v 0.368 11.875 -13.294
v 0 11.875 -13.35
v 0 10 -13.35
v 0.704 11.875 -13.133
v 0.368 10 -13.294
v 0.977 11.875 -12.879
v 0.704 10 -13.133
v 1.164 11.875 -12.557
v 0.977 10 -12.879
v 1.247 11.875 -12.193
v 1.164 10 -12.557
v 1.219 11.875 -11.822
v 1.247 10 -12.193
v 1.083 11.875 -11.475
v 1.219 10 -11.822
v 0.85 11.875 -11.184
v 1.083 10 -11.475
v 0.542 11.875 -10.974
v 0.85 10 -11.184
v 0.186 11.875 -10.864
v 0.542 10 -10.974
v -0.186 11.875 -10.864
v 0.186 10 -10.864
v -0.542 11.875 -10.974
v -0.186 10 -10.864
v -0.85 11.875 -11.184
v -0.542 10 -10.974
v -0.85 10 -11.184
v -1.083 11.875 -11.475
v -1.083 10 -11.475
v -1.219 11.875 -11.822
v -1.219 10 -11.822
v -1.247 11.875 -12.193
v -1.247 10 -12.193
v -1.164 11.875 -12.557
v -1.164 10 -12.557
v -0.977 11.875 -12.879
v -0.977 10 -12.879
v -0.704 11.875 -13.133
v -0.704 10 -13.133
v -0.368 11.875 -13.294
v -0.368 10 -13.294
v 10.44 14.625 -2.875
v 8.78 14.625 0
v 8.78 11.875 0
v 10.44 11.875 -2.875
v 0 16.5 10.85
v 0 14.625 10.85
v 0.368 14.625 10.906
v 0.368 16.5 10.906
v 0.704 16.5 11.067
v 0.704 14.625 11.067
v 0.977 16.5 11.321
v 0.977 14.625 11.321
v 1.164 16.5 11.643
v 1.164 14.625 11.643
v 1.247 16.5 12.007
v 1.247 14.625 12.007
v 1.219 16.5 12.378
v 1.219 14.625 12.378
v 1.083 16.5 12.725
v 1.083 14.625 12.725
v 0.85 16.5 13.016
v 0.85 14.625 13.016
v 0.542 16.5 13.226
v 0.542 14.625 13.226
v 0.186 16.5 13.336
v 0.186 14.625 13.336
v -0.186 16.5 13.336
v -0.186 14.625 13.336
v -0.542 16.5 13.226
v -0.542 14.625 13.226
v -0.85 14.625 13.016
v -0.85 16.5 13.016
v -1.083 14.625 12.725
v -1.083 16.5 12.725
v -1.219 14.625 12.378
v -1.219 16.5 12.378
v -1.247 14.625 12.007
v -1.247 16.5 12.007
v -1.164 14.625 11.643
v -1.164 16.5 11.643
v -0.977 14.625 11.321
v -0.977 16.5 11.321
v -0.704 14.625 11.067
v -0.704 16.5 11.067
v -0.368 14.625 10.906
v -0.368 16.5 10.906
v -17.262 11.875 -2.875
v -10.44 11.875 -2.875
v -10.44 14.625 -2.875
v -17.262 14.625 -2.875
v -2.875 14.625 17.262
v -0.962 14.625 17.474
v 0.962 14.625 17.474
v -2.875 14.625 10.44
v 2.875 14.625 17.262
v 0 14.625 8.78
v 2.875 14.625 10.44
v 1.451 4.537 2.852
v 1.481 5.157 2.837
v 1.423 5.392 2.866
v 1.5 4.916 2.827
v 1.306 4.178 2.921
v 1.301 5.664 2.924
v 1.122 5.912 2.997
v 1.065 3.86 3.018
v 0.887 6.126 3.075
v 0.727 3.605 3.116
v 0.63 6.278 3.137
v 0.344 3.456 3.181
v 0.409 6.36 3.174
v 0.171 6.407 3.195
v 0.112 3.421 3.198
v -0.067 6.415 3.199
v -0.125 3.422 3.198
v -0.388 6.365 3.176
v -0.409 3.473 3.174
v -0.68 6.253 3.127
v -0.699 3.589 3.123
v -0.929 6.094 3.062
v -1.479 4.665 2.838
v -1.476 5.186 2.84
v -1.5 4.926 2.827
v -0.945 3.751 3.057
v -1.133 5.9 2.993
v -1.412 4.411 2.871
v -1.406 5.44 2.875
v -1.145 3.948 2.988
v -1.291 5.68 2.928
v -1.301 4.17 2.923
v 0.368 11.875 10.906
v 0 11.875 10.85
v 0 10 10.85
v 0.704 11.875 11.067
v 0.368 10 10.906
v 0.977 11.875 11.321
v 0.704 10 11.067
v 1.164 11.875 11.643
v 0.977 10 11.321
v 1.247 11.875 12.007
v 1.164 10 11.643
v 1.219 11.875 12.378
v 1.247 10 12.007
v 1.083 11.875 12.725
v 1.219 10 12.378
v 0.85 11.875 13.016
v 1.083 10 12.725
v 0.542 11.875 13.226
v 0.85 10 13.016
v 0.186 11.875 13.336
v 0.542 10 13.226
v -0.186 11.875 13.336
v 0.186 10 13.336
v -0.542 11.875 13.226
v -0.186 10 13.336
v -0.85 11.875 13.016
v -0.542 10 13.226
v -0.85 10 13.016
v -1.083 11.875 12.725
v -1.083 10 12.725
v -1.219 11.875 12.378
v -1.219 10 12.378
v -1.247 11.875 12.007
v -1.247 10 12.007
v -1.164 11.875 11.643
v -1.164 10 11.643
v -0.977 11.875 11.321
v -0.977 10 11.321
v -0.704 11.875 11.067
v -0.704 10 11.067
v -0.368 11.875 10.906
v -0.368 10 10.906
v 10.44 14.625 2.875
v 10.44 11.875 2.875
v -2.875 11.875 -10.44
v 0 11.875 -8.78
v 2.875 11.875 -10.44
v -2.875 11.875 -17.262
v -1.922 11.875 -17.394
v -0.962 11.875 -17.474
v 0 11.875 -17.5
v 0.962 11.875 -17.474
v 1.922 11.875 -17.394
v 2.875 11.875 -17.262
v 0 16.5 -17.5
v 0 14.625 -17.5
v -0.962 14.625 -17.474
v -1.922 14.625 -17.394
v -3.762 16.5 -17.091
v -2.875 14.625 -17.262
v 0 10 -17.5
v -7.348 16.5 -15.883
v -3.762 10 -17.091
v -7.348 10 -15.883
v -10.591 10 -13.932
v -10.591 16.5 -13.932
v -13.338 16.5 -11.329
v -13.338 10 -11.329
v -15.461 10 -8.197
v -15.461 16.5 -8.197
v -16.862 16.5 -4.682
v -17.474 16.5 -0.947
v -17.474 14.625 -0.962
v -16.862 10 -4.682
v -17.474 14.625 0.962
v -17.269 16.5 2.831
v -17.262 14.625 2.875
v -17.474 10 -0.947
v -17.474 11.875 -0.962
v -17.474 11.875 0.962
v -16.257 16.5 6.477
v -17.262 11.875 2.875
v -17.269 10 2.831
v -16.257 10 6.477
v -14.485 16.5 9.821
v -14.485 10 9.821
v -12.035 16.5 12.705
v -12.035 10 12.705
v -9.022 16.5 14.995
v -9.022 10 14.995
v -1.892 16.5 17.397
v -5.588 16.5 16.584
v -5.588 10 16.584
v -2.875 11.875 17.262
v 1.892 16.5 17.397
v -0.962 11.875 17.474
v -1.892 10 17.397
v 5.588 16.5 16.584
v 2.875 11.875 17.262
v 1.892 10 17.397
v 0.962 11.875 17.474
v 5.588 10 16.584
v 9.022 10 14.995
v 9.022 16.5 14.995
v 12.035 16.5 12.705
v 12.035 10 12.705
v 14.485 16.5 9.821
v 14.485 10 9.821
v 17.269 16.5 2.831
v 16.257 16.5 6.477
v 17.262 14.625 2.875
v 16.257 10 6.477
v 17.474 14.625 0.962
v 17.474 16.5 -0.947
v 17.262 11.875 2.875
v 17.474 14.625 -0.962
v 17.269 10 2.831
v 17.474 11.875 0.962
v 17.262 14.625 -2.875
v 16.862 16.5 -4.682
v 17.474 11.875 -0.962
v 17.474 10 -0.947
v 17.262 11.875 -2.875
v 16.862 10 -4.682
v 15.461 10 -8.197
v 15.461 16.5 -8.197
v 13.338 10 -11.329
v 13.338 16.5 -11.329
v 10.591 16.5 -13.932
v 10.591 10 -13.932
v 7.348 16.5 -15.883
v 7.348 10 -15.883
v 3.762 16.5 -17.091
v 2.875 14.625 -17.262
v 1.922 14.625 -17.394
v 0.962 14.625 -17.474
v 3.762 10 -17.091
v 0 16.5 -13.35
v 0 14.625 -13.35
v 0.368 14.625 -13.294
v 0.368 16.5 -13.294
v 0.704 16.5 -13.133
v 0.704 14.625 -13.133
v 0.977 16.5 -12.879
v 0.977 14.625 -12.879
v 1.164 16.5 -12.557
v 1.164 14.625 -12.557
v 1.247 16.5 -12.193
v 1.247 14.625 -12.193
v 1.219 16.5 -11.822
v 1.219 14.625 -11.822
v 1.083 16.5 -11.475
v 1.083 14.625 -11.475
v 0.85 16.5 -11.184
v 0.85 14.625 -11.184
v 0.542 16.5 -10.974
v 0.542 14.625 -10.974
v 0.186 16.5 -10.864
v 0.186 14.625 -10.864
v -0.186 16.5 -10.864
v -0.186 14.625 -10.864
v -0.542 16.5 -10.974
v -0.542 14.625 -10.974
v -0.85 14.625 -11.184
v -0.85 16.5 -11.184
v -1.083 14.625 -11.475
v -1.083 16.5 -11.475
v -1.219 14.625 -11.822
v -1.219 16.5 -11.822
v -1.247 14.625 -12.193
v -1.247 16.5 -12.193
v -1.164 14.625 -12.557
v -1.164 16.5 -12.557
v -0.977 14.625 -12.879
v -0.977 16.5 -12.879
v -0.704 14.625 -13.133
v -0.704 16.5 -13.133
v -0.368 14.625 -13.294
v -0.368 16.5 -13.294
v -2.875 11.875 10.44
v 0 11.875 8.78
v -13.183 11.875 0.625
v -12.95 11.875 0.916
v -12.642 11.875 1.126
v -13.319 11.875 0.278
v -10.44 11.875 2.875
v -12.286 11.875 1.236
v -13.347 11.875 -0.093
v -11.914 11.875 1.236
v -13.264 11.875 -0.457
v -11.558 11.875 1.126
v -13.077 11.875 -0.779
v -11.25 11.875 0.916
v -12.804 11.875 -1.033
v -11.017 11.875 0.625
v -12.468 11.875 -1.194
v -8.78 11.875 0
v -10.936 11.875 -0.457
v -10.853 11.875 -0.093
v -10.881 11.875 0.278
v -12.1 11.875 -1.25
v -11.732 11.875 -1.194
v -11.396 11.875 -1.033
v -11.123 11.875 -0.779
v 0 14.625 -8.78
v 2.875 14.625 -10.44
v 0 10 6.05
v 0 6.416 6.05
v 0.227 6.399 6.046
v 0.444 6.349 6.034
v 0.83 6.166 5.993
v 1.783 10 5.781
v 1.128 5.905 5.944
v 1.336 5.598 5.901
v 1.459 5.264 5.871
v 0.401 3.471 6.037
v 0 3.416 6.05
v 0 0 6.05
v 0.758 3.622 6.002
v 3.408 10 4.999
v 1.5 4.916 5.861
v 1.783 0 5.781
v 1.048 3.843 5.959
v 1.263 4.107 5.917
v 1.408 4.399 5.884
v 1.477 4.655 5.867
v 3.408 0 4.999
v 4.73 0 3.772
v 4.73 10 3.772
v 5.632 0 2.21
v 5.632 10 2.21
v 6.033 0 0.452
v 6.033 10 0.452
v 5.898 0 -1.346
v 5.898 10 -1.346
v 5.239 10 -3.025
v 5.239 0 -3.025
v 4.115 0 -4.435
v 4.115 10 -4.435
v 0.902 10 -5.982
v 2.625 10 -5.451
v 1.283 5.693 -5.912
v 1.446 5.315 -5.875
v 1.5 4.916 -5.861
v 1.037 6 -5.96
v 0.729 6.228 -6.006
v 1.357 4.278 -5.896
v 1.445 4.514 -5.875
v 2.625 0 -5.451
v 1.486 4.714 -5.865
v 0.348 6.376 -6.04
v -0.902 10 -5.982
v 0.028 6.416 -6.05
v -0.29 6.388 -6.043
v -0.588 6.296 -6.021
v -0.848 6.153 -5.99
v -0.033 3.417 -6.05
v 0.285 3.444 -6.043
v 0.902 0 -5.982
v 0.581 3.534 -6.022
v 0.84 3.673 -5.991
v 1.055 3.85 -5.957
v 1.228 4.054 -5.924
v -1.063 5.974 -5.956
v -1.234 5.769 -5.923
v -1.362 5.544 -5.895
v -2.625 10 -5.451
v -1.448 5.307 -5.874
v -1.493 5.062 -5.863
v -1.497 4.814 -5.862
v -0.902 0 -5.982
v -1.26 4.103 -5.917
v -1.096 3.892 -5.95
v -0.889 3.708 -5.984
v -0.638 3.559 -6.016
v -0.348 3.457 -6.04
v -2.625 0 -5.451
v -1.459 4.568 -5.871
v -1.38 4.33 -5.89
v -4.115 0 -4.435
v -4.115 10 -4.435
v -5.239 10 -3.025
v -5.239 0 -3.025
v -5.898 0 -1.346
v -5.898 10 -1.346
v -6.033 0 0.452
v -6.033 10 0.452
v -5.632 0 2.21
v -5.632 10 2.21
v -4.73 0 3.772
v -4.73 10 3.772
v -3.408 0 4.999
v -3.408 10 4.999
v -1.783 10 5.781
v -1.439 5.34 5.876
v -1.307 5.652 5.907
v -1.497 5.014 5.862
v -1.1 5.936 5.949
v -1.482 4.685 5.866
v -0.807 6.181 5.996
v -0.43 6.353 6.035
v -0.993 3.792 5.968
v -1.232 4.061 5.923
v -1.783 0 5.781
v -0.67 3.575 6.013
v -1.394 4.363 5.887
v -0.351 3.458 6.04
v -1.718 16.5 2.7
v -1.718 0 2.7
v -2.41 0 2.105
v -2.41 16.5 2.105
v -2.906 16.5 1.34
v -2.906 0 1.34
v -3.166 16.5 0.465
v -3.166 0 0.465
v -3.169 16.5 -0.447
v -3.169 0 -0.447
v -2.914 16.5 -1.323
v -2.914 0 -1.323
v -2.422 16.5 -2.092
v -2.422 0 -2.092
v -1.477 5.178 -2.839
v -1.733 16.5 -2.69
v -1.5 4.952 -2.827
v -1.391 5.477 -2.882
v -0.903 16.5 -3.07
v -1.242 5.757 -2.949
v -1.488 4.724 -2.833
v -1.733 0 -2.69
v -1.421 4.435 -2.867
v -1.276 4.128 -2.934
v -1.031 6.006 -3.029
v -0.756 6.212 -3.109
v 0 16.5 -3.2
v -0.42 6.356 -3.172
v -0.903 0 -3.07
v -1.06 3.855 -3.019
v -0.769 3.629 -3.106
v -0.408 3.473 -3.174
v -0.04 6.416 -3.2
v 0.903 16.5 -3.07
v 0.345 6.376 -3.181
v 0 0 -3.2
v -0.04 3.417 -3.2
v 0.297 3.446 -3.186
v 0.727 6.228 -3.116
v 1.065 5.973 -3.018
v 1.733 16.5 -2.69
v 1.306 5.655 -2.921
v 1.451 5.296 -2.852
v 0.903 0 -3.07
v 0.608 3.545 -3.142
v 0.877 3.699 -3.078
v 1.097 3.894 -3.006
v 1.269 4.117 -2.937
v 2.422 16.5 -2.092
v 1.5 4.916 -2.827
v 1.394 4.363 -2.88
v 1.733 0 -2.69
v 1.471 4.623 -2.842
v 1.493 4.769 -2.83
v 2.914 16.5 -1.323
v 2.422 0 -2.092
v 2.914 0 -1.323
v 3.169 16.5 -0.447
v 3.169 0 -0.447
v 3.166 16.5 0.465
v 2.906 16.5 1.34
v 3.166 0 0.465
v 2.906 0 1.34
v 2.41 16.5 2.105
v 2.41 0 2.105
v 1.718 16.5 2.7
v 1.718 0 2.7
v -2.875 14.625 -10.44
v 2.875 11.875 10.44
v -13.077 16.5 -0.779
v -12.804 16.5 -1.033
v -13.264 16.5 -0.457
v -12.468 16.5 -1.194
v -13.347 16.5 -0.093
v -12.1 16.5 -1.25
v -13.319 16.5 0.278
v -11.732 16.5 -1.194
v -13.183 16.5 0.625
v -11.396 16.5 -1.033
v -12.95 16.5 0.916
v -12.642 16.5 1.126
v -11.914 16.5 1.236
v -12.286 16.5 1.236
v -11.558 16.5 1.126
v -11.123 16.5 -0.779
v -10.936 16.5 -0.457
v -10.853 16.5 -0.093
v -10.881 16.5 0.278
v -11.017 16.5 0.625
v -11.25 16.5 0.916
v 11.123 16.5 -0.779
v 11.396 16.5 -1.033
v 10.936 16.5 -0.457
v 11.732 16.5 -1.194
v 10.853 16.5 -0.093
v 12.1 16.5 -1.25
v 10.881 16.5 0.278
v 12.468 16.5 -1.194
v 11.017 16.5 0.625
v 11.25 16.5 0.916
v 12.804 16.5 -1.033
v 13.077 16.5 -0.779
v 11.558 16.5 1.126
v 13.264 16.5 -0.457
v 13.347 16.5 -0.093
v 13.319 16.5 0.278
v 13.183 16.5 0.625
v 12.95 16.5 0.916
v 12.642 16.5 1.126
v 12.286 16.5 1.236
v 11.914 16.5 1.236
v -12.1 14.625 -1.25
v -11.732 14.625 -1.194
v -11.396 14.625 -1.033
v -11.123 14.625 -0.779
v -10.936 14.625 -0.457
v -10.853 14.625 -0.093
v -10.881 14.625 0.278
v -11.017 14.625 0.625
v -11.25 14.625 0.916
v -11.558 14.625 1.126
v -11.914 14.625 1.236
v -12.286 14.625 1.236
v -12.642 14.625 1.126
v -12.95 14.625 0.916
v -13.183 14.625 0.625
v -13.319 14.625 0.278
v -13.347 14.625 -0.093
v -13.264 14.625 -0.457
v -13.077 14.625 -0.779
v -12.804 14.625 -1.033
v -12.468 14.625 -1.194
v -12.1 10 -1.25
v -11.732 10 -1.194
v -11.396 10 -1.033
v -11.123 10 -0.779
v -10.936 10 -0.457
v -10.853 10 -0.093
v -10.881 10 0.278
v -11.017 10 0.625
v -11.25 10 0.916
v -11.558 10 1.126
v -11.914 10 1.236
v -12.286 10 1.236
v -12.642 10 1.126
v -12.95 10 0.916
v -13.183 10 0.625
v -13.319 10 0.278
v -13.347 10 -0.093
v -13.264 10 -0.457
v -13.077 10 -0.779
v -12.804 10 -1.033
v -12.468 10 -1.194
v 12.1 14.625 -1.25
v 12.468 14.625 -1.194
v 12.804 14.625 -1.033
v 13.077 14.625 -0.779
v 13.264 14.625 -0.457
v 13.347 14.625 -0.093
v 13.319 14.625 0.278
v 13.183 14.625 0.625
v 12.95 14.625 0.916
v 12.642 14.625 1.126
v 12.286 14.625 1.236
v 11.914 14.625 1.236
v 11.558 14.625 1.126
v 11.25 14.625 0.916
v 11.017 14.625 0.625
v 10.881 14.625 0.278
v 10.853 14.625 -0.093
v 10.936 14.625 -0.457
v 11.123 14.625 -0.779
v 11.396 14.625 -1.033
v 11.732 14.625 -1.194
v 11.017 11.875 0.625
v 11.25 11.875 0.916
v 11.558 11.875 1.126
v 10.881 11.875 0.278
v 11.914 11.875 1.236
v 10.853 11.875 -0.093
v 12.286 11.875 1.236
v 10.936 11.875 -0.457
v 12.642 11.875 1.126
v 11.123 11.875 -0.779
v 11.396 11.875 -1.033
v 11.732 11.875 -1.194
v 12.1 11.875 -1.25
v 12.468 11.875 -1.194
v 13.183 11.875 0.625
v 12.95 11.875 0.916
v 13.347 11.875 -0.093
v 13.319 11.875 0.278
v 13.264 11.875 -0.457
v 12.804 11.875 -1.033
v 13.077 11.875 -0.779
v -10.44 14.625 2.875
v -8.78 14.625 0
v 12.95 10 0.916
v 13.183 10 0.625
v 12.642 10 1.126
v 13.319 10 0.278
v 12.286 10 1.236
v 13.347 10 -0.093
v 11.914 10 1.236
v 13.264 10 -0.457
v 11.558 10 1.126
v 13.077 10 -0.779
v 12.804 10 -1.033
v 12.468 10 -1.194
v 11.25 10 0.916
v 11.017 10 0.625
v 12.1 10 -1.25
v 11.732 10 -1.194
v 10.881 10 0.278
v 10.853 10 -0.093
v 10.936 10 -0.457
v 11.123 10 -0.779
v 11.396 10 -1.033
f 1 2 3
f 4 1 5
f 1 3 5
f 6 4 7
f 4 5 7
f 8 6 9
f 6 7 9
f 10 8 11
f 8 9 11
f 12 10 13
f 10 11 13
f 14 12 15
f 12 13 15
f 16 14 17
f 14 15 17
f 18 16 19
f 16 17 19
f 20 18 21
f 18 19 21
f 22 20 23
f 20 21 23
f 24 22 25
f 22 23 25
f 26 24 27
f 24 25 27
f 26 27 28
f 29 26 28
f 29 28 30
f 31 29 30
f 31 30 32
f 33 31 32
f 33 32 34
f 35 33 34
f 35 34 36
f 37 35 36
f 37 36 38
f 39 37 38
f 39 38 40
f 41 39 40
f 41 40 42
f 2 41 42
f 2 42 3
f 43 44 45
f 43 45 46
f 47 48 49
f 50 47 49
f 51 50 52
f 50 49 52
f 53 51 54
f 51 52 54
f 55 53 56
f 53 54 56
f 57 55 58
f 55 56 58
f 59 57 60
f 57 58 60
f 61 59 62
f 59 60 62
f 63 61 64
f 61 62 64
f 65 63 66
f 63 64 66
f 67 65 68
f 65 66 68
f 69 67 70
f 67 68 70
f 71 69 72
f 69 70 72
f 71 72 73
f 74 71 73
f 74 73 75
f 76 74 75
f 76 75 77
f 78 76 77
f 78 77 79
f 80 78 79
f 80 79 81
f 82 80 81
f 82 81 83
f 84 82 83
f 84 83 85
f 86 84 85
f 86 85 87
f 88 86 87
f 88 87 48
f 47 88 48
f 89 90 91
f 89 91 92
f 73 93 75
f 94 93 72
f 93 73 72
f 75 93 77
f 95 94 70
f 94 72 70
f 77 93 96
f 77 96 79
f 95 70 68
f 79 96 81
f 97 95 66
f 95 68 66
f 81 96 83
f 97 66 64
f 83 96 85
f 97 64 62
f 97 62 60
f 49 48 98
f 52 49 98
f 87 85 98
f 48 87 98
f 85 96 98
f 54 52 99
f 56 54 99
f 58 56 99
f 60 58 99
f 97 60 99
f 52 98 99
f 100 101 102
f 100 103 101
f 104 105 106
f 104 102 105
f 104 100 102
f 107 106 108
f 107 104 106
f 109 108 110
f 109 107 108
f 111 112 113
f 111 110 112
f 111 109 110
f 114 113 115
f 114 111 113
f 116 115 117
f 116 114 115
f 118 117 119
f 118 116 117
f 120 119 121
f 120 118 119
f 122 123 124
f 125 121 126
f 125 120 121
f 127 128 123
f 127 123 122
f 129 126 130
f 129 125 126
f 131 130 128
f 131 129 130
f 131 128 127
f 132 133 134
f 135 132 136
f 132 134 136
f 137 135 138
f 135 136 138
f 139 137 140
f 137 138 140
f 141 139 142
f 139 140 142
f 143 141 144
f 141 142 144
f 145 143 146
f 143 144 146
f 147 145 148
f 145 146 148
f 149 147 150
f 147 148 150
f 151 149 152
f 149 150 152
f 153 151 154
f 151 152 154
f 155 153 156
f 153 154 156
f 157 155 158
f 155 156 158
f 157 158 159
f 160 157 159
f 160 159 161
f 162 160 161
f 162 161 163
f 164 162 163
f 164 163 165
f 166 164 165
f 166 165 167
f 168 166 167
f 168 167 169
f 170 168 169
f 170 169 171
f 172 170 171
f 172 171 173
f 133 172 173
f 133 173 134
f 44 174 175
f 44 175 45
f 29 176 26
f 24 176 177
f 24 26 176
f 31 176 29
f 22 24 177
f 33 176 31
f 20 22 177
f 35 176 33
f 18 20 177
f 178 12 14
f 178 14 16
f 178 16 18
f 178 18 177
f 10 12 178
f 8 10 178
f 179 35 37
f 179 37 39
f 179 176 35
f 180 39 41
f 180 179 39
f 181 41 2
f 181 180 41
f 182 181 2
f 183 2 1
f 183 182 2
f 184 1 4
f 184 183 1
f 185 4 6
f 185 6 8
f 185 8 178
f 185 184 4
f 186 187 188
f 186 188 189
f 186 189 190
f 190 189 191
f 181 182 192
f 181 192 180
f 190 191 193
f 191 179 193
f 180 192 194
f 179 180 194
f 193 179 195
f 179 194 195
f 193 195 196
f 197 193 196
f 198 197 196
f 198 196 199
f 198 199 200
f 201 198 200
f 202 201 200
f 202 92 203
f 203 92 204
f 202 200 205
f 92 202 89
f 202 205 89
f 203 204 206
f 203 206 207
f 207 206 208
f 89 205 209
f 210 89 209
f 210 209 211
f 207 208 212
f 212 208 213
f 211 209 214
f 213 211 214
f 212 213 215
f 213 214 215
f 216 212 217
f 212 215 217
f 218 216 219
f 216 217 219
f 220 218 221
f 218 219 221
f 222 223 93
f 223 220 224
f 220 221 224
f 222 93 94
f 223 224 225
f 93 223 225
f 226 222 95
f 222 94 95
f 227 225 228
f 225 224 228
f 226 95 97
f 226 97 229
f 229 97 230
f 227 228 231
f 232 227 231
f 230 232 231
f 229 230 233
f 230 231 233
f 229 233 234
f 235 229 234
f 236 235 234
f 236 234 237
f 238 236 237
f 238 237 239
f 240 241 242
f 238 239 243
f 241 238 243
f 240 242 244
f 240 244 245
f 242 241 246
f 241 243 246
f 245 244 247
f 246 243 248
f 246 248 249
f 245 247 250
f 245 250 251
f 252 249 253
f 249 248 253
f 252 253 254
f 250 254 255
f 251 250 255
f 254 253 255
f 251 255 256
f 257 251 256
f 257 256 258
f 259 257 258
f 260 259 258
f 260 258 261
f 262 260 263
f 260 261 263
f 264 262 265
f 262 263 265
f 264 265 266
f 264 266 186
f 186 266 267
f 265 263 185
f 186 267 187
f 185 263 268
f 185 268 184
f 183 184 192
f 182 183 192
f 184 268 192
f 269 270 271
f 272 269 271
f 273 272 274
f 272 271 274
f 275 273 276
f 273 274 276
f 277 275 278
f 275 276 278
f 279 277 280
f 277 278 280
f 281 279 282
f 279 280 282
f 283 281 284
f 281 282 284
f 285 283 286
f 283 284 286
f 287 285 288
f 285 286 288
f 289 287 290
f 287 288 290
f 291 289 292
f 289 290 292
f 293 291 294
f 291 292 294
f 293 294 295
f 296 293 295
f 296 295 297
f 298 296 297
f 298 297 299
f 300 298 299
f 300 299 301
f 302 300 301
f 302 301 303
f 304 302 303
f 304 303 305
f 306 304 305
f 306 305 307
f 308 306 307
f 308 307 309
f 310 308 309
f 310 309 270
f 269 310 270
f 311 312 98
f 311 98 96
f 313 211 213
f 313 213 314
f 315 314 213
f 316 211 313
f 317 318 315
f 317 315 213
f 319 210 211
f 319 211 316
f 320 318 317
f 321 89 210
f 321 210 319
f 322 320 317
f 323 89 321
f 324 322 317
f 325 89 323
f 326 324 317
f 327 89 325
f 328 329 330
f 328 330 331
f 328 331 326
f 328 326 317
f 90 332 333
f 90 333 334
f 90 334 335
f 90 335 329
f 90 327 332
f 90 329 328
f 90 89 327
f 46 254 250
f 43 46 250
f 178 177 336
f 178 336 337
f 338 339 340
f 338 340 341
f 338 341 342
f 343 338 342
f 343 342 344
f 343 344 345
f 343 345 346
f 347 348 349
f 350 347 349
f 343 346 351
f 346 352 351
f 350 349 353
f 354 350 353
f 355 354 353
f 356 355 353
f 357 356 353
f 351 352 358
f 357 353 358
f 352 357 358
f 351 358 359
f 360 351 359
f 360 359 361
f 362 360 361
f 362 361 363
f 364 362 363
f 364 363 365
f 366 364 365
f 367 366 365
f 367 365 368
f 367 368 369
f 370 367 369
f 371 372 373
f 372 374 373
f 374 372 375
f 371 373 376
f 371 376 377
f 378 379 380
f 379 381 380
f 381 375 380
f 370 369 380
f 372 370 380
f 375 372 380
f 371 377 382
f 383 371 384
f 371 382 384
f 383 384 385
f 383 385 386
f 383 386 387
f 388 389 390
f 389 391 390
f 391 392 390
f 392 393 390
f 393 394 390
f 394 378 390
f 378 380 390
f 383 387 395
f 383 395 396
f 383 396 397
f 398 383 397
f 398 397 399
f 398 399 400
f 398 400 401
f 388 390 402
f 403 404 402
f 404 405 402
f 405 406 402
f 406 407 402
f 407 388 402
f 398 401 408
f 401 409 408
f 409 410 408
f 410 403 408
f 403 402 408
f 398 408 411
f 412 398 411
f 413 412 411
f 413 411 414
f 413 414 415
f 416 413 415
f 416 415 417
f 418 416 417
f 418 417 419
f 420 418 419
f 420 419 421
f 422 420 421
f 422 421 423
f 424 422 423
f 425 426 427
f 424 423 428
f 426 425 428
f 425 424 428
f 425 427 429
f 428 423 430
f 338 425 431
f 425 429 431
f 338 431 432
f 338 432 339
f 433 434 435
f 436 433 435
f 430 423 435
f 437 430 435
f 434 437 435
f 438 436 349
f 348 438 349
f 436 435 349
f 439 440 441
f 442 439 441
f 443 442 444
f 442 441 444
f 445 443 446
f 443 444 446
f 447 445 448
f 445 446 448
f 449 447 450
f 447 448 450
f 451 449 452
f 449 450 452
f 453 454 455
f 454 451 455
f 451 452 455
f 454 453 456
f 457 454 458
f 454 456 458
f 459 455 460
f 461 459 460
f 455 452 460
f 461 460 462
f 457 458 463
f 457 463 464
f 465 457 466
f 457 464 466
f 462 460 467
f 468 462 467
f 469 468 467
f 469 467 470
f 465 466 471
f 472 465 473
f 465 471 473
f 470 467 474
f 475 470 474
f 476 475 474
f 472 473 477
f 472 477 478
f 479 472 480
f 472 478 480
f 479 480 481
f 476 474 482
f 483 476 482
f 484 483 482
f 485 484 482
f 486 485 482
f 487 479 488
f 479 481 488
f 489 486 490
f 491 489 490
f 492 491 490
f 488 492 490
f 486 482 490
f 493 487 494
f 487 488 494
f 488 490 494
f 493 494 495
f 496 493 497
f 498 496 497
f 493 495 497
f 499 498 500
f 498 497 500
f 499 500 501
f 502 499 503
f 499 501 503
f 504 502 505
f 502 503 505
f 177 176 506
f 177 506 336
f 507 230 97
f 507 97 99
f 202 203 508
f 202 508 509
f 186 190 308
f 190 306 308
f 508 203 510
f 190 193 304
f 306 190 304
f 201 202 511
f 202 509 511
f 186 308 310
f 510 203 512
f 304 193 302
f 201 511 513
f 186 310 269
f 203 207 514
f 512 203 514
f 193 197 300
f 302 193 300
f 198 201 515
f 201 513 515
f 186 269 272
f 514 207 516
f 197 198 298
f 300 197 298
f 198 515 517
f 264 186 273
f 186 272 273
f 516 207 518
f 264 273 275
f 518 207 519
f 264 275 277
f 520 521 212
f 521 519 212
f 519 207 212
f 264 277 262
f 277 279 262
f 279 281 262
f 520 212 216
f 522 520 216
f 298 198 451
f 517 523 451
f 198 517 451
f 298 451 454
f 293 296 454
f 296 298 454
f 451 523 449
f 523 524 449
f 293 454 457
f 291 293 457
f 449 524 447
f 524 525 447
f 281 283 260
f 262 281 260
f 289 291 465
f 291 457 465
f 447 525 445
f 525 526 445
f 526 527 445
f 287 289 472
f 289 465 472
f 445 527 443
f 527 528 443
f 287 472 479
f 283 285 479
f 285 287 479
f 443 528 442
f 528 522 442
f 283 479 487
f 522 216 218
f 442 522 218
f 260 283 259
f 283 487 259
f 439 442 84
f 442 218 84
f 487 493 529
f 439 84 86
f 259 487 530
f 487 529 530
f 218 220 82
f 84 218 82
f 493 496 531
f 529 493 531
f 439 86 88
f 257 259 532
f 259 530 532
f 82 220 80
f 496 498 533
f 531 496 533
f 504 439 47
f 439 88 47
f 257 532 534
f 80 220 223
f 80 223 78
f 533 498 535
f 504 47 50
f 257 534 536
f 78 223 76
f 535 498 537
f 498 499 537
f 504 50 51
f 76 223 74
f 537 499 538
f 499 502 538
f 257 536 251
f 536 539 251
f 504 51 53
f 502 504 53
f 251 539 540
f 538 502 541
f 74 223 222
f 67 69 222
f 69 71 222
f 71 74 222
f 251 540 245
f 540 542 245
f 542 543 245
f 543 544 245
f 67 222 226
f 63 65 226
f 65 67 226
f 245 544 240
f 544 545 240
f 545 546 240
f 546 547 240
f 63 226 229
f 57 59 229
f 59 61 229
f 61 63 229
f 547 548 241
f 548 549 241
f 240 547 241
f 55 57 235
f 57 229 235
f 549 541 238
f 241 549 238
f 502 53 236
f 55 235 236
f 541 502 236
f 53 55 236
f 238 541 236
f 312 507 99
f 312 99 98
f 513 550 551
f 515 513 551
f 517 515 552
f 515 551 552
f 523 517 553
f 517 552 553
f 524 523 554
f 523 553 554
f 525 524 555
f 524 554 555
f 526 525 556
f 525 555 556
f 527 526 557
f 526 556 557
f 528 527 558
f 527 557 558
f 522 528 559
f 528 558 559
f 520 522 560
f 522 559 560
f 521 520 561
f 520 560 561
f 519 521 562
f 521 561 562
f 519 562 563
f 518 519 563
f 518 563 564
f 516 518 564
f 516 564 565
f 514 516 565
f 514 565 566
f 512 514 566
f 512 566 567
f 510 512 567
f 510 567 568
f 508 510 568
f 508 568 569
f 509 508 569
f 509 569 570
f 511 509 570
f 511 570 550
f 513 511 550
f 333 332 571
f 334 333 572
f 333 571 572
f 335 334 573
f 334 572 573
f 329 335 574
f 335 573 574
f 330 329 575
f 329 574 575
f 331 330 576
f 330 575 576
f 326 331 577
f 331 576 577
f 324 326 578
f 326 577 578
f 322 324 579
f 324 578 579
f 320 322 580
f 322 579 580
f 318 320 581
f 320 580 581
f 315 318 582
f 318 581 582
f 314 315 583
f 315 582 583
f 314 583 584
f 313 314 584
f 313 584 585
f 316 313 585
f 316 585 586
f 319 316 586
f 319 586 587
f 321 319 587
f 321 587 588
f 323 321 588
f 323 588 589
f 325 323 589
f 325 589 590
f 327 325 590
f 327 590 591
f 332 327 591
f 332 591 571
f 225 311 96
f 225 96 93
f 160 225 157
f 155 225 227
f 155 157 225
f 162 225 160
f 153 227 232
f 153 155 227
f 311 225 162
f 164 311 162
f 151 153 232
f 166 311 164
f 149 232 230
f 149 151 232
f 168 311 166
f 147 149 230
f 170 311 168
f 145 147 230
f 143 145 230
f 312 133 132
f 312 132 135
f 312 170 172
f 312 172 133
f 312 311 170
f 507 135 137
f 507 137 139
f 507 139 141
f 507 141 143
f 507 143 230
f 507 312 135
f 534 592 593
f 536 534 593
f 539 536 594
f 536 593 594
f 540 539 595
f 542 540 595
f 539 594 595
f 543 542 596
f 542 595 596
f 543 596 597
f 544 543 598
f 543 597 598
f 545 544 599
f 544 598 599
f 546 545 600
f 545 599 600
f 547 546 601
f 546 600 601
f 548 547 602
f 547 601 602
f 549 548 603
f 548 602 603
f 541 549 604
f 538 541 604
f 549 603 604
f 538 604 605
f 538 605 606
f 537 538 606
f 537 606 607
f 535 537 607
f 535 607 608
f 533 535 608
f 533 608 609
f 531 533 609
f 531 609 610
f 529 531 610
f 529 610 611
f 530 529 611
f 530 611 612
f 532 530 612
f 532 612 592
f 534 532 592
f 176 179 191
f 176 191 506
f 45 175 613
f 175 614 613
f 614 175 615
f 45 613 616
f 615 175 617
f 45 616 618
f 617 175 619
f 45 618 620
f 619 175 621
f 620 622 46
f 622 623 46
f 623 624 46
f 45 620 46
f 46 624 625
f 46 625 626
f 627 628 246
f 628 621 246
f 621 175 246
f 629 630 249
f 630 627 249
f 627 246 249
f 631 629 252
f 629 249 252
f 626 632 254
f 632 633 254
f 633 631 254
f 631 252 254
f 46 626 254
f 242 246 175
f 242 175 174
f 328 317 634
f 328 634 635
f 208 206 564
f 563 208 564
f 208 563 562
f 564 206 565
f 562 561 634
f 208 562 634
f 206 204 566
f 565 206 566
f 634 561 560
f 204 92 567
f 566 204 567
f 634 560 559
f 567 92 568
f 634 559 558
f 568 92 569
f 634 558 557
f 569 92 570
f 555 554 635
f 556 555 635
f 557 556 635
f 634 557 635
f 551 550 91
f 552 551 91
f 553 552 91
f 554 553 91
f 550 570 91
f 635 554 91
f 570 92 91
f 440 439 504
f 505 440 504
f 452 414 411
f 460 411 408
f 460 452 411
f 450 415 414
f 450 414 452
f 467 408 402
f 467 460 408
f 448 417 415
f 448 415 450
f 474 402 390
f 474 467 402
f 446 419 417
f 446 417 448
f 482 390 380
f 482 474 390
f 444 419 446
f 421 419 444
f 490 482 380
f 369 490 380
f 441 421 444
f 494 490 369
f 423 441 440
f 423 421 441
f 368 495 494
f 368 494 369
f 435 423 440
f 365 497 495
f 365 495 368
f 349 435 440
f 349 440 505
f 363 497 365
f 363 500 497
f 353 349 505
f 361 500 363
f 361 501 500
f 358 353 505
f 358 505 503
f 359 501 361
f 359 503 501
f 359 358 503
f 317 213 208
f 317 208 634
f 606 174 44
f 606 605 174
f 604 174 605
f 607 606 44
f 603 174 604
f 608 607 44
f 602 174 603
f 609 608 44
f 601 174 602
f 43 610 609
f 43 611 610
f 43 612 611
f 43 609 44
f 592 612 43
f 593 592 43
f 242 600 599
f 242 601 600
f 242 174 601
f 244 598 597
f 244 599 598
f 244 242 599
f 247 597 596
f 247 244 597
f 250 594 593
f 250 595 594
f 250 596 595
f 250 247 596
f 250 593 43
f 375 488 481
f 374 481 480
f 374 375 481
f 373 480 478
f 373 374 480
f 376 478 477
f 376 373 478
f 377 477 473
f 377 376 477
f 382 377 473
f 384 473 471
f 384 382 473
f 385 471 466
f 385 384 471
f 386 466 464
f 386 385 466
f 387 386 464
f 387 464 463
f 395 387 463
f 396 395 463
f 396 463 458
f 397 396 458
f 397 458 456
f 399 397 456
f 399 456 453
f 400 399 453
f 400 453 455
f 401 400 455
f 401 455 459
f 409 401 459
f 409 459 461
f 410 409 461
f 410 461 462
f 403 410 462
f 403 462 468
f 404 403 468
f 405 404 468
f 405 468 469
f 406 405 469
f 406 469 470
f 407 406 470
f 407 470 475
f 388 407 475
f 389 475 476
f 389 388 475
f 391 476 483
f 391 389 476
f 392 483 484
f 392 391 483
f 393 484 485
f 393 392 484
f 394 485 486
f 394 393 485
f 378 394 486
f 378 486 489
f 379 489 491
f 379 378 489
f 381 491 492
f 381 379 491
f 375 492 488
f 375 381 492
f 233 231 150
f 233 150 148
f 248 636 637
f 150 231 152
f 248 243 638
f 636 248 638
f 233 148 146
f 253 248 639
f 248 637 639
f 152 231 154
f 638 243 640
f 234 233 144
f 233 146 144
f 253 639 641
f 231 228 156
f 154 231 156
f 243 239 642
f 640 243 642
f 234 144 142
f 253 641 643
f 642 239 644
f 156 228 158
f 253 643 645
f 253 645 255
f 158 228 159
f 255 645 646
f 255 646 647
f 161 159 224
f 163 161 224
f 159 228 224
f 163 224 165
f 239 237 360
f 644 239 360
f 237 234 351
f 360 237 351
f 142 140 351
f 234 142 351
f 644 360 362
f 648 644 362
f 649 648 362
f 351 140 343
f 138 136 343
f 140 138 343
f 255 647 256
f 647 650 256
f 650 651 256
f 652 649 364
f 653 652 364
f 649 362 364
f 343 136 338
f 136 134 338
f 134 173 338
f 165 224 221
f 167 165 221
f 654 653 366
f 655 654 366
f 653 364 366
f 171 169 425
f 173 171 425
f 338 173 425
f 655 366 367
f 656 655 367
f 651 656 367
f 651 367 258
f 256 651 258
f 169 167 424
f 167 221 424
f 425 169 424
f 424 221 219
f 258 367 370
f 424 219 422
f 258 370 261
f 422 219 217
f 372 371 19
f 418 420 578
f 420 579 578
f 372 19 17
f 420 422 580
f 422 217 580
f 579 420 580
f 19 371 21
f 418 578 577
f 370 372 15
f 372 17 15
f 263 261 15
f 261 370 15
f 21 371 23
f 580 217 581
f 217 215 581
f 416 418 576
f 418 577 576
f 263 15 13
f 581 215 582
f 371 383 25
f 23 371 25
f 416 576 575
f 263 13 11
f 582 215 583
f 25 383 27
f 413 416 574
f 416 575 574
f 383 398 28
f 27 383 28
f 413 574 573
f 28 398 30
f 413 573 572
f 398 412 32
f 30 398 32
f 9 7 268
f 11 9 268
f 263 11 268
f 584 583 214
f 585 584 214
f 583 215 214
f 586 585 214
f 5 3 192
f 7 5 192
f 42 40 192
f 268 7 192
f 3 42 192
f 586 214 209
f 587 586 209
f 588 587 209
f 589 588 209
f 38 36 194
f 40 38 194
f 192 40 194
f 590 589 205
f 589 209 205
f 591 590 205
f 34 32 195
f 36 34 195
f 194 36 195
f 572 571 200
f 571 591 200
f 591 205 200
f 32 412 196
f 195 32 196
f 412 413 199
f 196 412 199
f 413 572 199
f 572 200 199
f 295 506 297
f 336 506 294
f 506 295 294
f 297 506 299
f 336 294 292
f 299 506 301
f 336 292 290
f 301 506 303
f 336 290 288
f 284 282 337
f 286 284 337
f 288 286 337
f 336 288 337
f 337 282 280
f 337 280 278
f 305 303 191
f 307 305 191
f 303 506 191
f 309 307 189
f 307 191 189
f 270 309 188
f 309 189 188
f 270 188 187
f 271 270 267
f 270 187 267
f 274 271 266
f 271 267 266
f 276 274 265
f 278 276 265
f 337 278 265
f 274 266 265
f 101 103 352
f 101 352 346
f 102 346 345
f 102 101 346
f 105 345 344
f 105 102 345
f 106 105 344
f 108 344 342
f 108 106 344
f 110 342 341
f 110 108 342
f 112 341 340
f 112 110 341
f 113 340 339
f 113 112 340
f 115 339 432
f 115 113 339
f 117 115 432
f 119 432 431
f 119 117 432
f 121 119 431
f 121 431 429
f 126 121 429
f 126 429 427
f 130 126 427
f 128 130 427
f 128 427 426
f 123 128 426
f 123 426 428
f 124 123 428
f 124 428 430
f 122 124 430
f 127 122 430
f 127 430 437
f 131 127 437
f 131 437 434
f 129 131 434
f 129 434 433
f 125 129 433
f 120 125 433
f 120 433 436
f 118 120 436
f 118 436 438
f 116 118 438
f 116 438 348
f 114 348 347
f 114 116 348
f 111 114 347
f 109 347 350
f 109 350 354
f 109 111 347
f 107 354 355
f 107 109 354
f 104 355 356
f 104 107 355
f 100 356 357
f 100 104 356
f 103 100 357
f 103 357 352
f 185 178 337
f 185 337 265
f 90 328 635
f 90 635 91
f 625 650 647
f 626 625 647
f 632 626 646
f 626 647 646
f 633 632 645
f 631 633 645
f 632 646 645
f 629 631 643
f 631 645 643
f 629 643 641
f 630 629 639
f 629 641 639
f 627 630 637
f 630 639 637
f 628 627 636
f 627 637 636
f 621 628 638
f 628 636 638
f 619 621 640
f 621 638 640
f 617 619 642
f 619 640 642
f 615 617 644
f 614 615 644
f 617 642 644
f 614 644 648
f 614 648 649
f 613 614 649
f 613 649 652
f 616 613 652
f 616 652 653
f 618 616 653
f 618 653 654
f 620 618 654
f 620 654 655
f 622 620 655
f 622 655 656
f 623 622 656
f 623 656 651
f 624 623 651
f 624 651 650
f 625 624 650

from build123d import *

# Parameters (mm, degrees)
SKETCH1_R                      = 6.05
SKETCH1_R_2                    = 3.05
BOSS_EXTRUDE1_DEPTH            = 10
SKETCH2_R                      = 17.5
BOSS_EXTRUDE2_DEPTH            = 6.5
CUT_EXTRUDE1_REACH             = 28.693
SKETCH3_R                      = 1.25
CUT_EXTRUDE2_DEPTH             = 30.744747435
CUT_EXTRUDE2_DEPTH_BACK        = 30.744747435
SKETCH4_R                      = 1.5
CUT_EXTRUDE3_REACH             = 28.693
SKETCH6_R                      = 3.2
CUT_EXTRUDE3_DIRECTION_2_REACH = 28.693
BOSS_EXTRUDE3_DEPTH            = 16.5
SKETCH8_W                      = 5.75
SKETCH8_H                      = 2.75
CUT_EXTRUDE4_DEPTH             = 5
CUT_EXTRUDE5_DEPTH             = 2.75
CIRPATTERN1_START              = 11.875
CIRPATTERN1_OUTLINE_R          = 1.25
CIRPATTERN1_DEPTH              = 2.75


# Read off the part's stored shape, not the designer's step: CirPattern1
with BuildPart() as part:
    # Sketch1 → Boss-Extrude1 (new body)
    with BuildSketch(Plane(origin=(0, 0, 0), x_dir=(1, 0, 0), z_dir=(0, 1, 0))):
        with Locations(Location((0, 0, 0), (0, 0, 270))):
            Circle(SKETCH1_R)
        with Locations(Location((0, 0, 0), (0, 0, 270))):
            Circle(SKETCH1_R_2, mode=Mode.SUBTRACT)
    extrude(amount=BOSS_EXTRUDE1_DEPTH)

    # Sketch2 → Boss-Extrude2 (add)
    with BuildSketch(Plane(origin=(0, 10, 0), x_dir=(1, 0, 0), z_dir=(0, 1, 0))):
        with Locations(Location((0, 0, 0), (0, 0, 90))):
            Circle(SKETCH2_R)
    extrude(amount=BOSS_EXTRUDE2_DEPTH)

    # Sketch3 → Cut-Extrude1 (cut, up to next)
    with BuildSketch(Plane.XZ.offset(-10), mode=Mode.PRIVATE) as cut_extrude1_sk1:
        with Locations(Location((12.1, 0, 0), (0, 0, 270))):
            Circle(SKETCH3_R)
    cut_extrude1_tool1 = extrude(cut_extrude1_sk1.sketch, amount=-CUT_EXTRUDE1_REACH, mode=Mode.PRIVATE) & part.part
    # Sketch3 → Cut-Extrude1 (cut, up to next)
    with BuildSketch(Plane.XZ.offset(-10), mode=Mode.PRIVATE) as cut_extrude1_sk2:
        with Locations(Location((0, -12.1, 0), (0, 0, 270))):
            Circle(SKETCH3_R)
    cut_extrude1_tool2 = extrude(cut_extrude1_sk2.sketch, amount=-CUT_EXTRUDE1_REACH, mode=Mode.PRIVATE) & part.part
    # Sketch3 → Cut-Extrude1 (cut, up to next)
    with BuildSketch(Plane.XZ.offset(-10), mode=Mode.PRIVATE) as cut_extrude1_sk3:
        with Locations(Location((-12.1, 0, 0), (0, 0, 270))):
            Circle(SKETCH3_R)
    cut_extrude1_tool3 = extrude(cut_extrude1_sk3.sketch, amount=-CUT_EXTRUDE1_REACH, mode=Mode.PRIVATE) & part.part
    # Sketch3 → Cut-Extrude1 (cut, up to next)
    with BuildSketch(Plane.XZ.offset(-10), mode=Mode.PRIVATE) as cut_extrude1_sk4:
        with Locations(Location((0, 12.1, 0), (0, 0, 270))):
            Circle(SKETCH3_R)
    cut_extrude1_tool4 = extrude(cut_extrude1_sk4.sketch, amount=-CUT_EXTRUDE1_REACH, mode=Mode.PRIVATE) & part.part
    add(cut_extrude1_tool1.solids().sort_by_distance((12.1, 10, 0))[0], mode=Mode.SUBTRACT)
    add(cut_extrude1_tool2.solids().sort_by_distance((0, 10, -12.1))[0], mode=Mode.SUBTRACT)
    add(cut_extrude1_tool3.solids().sort_by_distance((-12.1, 10, 0))[0], mode=Mode.SUBTRACT)
    add(cut_extrude1_tool4.solids().sort_by_distance((0, 10, 12.1))[0], mode=Mode.SUBTRACT)

    # Sketch4 → Cut-Extrude2 (cut, two sides: drawn at the far end of the back side and taken through both)
    with BuildSketch(Plane.XY.offset(-CUT_EXTRUDE2_DEPTH_BACK)):
        with Locations((0, 4.916404418)):
            Circle(SKETCH4_R)
    extrude(amount=CUT_EXTRUDE2_DEPTH + CUT_EXTRUDE2_DEPTH_BACK, mode=Mode.SUBTRACT)

    # Sketch6 → Cut-Extrude3 (cut, up to next)
    with BuildSketch(Plane(origin=(0, 10, 0), x_dir=(-1, 0, 0), z_dir=(0, -1, 0)), mode=Mode.PRIVATE) as cut_extrude3_sk1:
        with Locations(Location((0, 0, 0), (0, 0, 270))):
            Circle(SKETCH6_R)
    cut_extrude3_tool1 = extrude(cut_extrude3_sk1.sketch, amount=-CUT_EXTRUDE3_REACH, mode=Mode.PRIVATE) & part.part
    add(cut_extrude3_tool1.solids().sort_by_distance((0, 10, 0))[0], mode=Mode.SUBTRACT)

    # Sketch6 → Cut-Extrude3 direction 2 (cut, up to next)
    with BuildSketch(Plane(origin=(0, 10, 0), x_dir=(-1, 0, 0), z_dir=(0, -1, 0)), mode=Mode.PRIVATE) as cut_extrude3_direction_2_sk1:
        with Locations(Location((0, 0, 0), (0, 0, 270))):
            Circle(SKETCH6_R)
    cut_extrude3_direction_2_tool1 = extrude(cut_extrude3_direction_2_sk1.sketch, amount=CUT_EXTRUDE3_DIRECTION_2_REACH, mode=Mode.PRIVATE) & part.part
    add(cut_extrude3_direction_2_tool1.solids().sort_by_distance((0, 10, 0))[0], mode=Mode.SUBTRACT)

    # Sketch7 → Boss-Extrude3 (add)
    with BuildSketch(Plane.XZ):
        with BuildLine():
            Line((-1.717556404, 2.7), (1.717556404, 2.7))
            ThreePointArc((1.717556404, 2.7), (0, 3.2), (-1.717556404, 2.7))
        make_face()
    extrude(amount=-BOSS_EXTRUDE3_DEPTH)

    # Sketch8 → Cut-Extrude4 (cut)
    with BuildSketch(Plane(origin=(17.5, 0, 0), x_dir=(0, 0, -1), z_dir=(1, 0, 0))):
        with Locations((0, 13.25)):
            Rectangle(SKETCH8_W, SKETCH8_H)
    extrude(amount=-CUT_EXTRUDE4_DEPTH, mode=Mode.SUBTRACT)

    # Sketch9 → Cut-Extrude5 (cut)
    with BuildSketch(Plane.XZ.offset(-14.625)):
        Polygon((15.419764048, 0), (13.759882024, 2.875), (10.440117976, 2.875), (8.780235952, 0), (10.440117976, -2.875), (13.759882024, -2.875), align=None)
    extrude(amount=CUT_EXTRUDE5_DEPTH, mode=Mode.SUBTRACT)

    # CirPattern1 outline → CirPattern1 (cut)
    # profile 1 of 3: a face of its own
    with BuildSketch(Plane(origin=(0, 0, 0), x_dir=(1, 0, 0), z_dir=(0, 1, 0)).offset(CIRPATTERN1_START)):
        with BuildLine():
            Line((-8.780235952, 0), (-10.440117976, 2.875))
            Line((-10.440117976, 2.875), (-17.26222393, 2.875))
            ThreePointArc((-17.26222393, 2.875), (-17.5, 0), (-17.26222393, -2.875))
            Line((-17.26222393, -2.875), (-10.440117976, -2.875))
            Line((-10.440117976, -2.875), (-8.780235952, 0))
        make_face()
        with Locations((-12.1, 0)):
            Circle(CIRPATTERN1_OUTLINE_R, mode=Mode.SUBTRACT)
    # profile 2 of 3: a face of its own
    with BuildSketch(Plane(origin=(0, 0, 0), x_dir=(1, 0, 0), z_dir=(0, 1, 0)).offset(CIRPATTERN1_START)):
        with BuildLine():
            ThreePointArc((2.875, 17.26222393), (0, 17.5), (-2.875, 17.26222393))
            Line((-2.875, 17.26222393), (-2.875, 10.440117976))
            Line((-2.875, 10.440117976), (0, 8.780235952))
            Line((0, 8.780235952), (2.875, 10.440117976))
            Line((2.875, 10.440117976), (2.875, 17.26222393))
        make_face()
        with Locations((0, 12.1)):
            Circle(CIRPATTERN1_OUTLINE_R, mode=Mode.SUBTRACT)
    # profile 3 of 3: a face of its own
    with BuildSketch(Plane(origin=(0, 0, 0), x_dir=(1, 0, 0), z_dir=(0, 1, 0)).offset(CIRPATTERN1_START)):
        with BuildLine():
            Line((-2.875, -10.440117976), (-2.875, -17.26222393))
            ThreePointArc((-2.875, -17.26222393), (0, -17.5), (2.875, -17.26222393))
            Line((2.875, -17.26222393), (2.875, -10.440117976))
            Line((2.875, -10.440117976), (0, -8.780235952))
            Line((0, -8.780235952), (-2.875, -10.440117976))
        make_face()
        with Locations((0, -12.1)):
            Circle(CIRPATTERN1_OUTLINE_R, mode=Mode.SUBTRACT)
    extrude(amount=CIRPATTERN1_DEPTH, mode=Mode.SUBTRACT)


solid = part.part
